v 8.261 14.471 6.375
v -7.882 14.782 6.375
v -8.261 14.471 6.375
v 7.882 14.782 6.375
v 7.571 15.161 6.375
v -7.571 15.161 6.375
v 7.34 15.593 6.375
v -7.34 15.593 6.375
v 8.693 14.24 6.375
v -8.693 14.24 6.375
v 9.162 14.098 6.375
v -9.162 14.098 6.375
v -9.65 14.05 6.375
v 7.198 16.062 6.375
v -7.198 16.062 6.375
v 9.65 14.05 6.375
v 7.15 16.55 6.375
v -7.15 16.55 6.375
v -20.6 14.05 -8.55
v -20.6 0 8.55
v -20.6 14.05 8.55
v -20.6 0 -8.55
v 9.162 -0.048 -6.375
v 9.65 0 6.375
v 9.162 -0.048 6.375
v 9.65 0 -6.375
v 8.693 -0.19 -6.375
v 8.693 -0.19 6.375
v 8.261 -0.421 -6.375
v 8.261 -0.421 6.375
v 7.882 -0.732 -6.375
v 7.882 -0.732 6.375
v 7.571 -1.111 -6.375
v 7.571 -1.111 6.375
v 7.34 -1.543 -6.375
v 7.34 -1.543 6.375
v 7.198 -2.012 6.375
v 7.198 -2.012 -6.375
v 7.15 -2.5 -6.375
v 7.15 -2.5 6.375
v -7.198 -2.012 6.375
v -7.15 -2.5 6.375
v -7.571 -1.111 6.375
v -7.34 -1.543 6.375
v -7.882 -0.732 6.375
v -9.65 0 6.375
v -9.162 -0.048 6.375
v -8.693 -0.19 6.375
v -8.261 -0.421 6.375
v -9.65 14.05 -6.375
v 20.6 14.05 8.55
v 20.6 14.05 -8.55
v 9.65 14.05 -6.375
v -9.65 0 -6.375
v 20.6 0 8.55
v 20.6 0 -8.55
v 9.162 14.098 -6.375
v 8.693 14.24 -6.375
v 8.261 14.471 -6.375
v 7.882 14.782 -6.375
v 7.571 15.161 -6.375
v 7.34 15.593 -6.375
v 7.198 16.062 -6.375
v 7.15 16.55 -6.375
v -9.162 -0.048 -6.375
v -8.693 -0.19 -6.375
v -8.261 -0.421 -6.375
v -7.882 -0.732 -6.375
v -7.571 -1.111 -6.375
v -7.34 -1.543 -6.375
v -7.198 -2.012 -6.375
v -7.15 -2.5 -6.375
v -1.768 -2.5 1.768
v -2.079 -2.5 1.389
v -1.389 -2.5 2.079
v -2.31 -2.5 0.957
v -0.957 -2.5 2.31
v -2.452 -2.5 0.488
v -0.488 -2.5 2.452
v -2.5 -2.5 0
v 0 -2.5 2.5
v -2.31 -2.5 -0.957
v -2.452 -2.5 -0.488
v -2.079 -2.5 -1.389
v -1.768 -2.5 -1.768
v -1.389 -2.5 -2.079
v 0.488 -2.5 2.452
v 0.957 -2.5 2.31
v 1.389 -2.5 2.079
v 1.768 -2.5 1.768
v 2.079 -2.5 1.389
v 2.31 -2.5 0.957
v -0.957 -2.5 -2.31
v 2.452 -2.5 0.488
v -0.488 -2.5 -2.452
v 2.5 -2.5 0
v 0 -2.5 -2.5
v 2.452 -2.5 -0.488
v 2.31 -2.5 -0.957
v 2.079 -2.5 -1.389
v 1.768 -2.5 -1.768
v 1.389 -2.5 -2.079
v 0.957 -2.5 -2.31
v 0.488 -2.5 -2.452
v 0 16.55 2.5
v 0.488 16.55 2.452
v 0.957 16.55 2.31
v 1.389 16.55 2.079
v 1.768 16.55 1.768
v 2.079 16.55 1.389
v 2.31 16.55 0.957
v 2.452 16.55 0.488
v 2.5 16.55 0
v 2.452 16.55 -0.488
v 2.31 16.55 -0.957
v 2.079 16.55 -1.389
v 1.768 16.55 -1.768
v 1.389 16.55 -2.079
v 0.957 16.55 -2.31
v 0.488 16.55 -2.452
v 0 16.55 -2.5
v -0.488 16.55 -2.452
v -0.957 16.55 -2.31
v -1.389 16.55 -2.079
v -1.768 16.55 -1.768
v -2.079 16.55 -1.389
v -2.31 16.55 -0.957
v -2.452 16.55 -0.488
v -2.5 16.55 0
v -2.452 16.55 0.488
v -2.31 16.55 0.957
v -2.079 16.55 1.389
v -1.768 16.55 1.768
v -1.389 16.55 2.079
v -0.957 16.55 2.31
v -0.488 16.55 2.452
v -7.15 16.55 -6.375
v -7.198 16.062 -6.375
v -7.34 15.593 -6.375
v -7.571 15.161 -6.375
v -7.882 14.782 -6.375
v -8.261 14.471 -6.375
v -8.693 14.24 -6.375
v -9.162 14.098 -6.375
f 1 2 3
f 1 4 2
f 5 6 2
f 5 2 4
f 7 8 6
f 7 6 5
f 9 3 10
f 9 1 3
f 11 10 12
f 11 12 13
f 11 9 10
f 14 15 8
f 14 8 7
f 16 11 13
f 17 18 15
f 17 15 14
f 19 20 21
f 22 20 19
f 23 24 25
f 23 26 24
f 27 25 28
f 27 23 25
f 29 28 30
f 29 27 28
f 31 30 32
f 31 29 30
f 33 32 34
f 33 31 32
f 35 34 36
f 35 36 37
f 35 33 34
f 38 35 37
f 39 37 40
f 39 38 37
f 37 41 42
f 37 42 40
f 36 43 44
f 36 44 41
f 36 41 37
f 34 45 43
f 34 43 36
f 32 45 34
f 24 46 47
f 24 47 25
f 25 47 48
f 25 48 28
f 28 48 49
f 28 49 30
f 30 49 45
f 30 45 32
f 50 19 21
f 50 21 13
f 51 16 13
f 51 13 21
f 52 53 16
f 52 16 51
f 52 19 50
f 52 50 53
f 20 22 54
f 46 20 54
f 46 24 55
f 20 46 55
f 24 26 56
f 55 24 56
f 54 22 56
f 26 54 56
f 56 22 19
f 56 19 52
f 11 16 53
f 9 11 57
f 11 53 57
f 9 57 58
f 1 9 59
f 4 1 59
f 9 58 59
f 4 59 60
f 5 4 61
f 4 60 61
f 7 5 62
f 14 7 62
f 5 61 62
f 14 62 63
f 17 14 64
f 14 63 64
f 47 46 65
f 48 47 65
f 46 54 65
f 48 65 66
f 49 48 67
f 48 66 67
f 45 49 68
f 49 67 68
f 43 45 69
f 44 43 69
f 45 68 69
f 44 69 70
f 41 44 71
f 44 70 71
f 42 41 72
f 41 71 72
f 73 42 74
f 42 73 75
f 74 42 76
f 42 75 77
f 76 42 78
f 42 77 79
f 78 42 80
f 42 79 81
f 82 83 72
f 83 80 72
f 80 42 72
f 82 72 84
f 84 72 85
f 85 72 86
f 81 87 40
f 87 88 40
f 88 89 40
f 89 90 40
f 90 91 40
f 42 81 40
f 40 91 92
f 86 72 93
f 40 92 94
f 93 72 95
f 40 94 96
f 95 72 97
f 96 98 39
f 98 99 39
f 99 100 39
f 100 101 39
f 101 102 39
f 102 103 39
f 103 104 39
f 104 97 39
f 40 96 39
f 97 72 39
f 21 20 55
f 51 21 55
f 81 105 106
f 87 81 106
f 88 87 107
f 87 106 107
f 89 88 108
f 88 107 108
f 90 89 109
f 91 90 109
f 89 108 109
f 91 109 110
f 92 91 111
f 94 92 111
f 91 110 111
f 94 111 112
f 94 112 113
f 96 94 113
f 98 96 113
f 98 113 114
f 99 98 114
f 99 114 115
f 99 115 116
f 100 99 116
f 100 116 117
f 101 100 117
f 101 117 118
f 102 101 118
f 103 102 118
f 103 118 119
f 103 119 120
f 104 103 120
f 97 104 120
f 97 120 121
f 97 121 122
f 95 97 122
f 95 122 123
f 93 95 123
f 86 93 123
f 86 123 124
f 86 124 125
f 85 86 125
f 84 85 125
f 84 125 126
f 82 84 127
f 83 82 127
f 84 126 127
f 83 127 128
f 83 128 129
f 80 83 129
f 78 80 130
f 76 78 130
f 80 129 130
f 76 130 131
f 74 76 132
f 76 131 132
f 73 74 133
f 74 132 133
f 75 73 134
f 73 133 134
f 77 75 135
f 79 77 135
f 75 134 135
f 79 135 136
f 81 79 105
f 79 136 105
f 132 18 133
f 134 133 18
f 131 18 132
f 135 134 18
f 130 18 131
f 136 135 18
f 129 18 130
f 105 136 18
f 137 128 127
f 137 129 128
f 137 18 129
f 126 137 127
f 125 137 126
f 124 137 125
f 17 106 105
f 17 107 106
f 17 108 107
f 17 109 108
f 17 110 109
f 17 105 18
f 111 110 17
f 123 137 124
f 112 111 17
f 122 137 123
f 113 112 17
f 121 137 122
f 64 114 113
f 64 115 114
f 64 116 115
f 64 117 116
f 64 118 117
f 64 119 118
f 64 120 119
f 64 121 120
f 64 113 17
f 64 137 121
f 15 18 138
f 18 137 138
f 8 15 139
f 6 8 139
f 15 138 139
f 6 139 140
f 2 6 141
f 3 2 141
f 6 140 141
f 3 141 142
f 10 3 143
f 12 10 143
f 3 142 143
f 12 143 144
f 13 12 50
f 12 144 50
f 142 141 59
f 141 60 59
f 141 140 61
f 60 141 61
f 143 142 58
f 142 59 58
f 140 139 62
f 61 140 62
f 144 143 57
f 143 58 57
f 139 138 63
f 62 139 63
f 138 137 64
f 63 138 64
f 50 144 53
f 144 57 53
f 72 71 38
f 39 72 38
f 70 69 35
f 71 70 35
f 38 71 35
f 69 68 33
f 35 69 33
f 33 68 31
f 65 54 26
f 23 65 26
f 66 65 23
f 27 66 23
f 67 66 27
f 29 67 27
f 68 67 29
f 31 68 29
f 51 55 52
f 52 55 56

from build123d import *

# Parameters (mm, degrees)
SKETCH1_W           = 41.2
SKETCH1_H           = 17.1
BOSS_EXTRUDE1_DEPTH = 14.05
BOSS_EXTRUDE2_START = 2.5
SKETCH2_W           = 14.3
SKETCH2_H           = 12.75
BOSS_EXTRUDE2_DEPTH = 19.05
FILLET1_R           = 2.5
SKETCH3_R           = 2.5
CUT_EXTRUDE1_DEPTH  = 30.331979135


with BuildPart() as part:
    # Sketch1 → Boss-Extrude1 (new body)
    with BuildSketch(Plane(origin=(0, 0, 0), x_dir=(1, 0, 0), z_dir=(0, 1, 0))):
        Rectangle(SKETCH1_W, SKETCH1_H)
    extrude(amount=BOSS_EXTRUDE1_DEPTH)

    # Sketch2 → Boss-Extrude2 (add)
    with BuildSketch(Plane(origin=(0, 14.05, 0), x_dir=(1, 0, 0), z_dir=(0, 1, 0)).offset(BOSS_EXTRUDE2_START)):
        Rectangle(SKETCH2_W, SKETCH2_H)
    extrude(amount=-BOSS_EXTRUDE2_DEPTH)

    # Fillet1
    fillet1_edges = [part.edges().sort_by_distance(p)[0] for p in [
        (7.15, 0, 0),
        (-7.15, 0, 0),
        (-7.15, 14.05, 0),
        (7.15, 14.05, 0),
    ]]
    fillet(fillet1_edges, radius=FILLET1_R - 0.0001)  # a hair under: the kernel refuses the full size

    # Sketch3 → Cut-Extrude1 (cut, through all)
    with BuildSketch(Plane(origin=(0, 16.55, 0), x_dir=(1, 0, 0), z_dir=(0, 1, 0))):
        with Locations(Location((0, 0, 0), (0, 0, 270))):
            Circle(SKETCH3_R)
    extrude(amount=-CUT_EXTRUDE1_DEPTH, mode=Mode.SUBTRACT)


solid = part.part
